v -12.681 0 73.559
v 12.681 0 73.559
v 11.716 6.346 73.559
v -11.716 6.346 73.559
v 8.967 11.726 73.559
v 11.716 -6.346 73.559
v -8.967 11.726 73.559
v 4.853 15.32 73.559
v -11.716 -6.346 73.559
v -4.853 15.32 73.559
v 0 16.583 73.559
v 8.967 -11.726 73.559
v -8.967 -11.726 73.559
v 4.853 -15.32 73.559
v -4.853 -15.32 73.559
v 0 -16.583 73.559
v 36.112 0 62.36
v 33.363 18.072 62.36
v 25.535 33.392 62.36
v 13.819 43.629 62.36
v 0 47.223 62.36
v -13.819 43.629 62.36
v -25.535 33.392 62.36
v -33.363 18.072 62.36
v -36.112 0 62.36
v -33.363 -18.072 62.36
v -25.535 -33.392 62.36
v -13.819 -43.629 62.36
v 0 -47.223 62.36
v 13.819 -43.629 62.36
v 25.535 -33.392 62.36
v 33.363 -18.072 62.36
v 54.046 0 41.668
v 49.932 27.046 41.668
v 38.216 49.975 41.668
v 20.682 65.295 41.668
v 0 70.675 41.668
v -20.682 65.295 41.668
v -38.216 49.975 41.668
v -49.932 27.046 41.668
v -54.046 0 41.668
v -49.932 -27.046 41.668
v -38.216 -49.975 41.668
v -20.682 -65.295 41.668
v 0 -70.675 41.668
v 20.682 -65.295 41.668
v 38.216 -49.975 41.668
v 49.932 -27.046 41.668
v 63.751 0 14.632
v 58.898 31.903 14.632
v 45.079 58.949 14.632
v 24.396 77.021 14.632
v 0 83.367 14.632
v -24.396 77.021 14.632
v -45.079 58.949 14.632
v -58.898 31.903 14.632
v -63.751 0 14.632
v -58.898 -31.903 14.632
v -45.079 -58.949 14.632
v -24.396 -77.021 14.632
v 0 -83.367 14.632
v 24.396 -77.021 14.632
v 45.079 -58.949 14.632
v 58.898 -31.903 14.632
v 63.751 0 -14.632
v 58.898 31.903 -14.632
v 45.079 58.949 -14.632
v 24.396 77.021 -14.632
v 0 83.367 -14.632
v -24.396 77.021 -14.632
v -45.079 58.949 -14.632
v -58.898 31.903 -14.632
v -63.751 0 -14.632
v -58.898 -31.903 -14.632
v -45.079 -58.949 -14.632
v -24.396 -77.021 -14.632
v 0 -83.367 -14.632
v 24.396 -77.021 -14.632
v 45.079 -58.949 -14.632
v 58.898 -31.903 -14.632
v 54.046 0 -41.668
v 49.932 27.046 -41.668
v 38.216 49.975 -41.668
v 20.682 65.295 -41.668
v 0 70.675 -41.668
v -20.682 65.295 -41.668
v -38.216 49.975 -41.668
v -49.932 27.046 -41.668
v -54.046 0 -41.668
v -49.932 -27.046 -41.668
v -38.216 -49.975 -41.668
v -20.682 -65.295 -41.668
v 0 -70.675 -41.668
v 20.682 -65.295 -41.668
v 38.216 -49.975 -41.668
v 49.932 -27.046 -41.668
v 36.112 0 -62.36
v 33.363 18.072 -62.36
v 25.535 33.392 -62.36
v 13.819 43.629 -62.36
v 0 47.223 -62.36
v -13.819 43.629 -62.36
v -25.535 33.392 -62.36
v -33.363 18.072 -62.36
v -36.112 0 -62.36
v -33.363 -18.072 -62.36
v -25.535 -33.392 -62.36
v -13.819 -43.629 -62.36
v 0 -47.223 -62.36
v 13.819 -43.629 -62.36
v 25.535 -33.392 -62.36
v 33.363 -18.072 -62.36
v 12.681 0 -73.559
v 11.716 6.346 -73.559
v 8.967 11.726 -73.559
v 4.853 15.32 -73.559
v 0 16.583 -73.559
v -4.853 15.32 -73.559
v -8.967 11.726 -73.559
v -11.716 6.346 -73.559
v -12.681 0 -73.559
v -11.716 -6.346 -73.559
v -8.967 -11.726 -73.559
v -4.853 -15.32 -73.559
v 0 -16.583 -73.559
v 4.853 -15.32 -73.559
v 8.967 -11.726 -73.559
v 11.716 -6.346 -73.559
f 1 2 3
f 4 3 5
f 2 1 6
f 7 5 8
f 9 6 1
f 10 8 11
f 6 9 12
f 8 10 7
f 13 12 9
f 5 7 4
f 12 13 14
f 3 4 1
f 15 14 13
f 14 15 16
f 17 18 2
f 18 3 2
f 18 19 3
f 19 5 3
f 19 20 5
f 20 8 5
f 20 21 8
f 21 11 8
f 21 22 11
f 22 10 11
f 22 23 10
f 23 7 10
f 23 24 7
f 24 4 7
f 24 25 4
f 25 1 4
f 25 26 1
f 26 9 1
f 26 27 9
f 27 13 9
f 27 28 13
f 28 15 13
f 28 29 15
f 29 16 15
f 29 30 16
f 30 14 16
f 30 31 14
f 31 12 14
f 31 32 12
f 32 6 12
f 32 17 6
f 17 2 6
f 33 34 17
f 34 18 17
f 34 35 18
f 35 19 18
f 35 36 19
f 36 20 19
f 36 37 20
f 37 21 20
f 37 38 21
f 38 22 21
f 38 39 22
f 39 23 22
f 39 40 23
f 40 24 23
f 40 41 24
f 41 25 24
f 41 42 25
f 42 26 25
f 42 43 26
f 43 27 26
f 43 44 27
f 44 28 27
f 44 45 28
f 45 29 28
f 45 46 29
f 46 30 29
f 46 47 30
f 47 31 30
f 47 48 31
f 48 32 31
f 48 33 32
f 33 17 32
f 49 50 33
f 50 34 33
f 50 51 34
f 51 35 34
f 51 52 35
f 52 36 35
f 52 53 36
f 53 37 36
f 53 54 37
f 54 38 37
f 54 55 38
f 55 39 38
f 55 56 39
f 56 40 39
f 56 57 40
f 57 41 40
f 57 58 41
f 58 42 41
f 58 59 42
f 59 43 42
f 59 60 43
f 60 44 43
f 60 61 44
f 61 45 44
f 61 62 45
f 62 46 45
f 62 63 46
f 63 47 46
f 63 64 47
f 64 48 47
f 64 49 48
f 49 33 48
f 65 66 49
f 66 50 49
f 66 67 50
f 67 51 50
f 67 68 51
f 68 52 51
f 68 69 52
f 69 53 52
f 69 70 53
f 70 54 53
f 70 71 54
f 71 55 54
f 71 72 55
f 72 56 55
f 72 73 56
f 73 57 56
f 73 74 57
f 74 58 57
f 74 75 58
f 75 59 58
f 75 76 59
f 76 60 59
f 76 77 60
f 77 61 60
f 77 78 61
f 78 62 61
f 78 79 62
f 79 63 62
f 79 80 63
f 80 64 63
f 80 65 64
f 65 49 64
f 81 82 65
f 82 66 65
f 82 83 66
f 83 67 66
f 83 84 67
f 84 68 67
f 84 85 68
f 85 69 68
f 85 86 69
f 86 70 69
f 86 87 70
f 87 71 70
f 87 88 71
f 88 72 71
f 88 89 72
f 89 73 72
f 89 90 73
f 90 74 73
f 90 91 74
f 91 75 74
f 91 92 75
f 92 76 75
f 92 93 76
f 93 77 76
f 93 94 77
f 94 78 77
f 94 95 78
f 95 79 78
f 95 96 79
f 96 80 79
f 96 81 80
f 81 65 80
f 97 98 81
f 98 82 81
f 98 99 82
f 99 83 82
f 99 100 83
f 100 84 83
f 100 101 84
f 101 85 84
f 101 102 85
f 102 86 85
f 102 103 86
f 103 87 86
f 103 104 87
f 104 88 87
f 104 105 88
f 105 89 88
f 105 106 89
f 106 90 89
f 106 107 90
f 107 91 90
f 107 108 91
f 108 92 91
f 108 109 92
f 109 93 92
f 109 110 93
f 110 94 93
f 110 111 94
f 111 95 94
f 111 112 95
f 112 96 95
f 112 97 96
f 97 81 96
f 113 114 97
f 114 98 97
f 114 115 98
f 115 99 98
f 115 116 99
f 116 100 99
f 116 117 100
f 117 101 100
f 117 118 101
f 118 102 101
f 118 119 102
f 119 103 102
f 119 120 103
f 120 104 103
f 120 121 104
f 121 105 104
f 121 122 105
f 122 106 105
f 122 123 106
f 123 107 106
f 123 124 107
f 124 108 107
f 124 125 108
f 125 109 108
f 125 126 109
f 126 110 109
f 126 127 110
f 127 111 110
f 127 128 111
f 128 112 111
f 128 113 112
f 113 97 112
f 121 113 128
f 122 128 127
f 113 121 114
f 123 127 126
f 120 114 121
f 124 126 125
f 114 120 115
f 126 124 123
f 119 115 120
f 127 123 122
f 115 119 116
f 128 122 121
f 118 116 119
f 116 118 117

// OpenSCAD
// Generated by SolidPython 1.0.1 on 2020-07-29 00:46:51


scale(v = [13, 17, 15]) {
	sphere(r = 5);
}
/***********************************************
*********      SolidPython code:      **********
************************************************
 
# import packages: SolidPython
from solid import *
from solid.utils import *
from itertools import chain, combinations, permutations


class Resize:

    def __init__(self, scad_file):
        self.scad_file = scad_file
        #self.scad_file = import_scad(scad_file)
        # cone/cylinder param:
        self.r1 = 0
        self.r2 = 0
        self.h = 0
        # rectangular prism param:
        self.w = 0
        self.l = 0
        # ellipse param:
        self.r = 0

    # import OpenScad code (file name corresponds to shape)


    # classify shape + parameters
    def assign(self, param1, param2, param3):
        if self.scad_file == 'cone.scad':
            self.r1 = param1
            self.r2 = param2
            self.h = param3
        elif self.scad_file == 'cylinder.scad':
            self.r1 = param1
            self.r2 = param2
            self.h = param3
        elif self.scad_file == 'rectangularPrism.scad':
            self.h = param1
            self.l = param2
            self.w = param3
        else:
            self.r = param1
            self.h = param2

    # resize parameters
    def iterate(self):
        x = range(3, 20, 2)
        i = 1
        if self.scad_file == 'cone.scad':
            tempList = list(permutations(x, 2))
            for temp in tempList:
                param1 = temp[0]
                param2 = temp[1]
                filepath = 'produced_scad_files/' + 'cone' + str(param1) + '_' + str(param2) + '_' + '.scad'
                scad_render_to_file(cylinder(h=param1, r1=param2, r2=0), filepath)

        elif self.scad_file == 'cylinder.scad':
            tempList = list(permutations(x, 3))
            for temp in tempList:
                param1 = temp[0]
                param2 = temp[1]
                filepath = 'produced_scad_files/' + 'cylinder' + str(param1) + '_' + str(param2) + '_' + '.scad'
                scad_render_to_file(cylinder(h=param1, r1=param2, r2=param2), filepath)

        elif self.scad_file == 'rectangularPrism.scad':
            tempList = list(permutations(x, 3))
            for temp in tempList:
                param1 = temp[0]
                param2 = temp[1]
                param3 = temp[2]
                filepath = 'produced_scad_files/' + 'rectangularPrism' + str(param1) + '_' + str(param2) + '_' + str(
                    param3) + '.scad'
                scad_render_to_file(cube(size=(param1, param2, param3)), filepath)

        elif self.scad_file == 'ellipse.scad':
            tempList = list(permutations(x, 4))
            for temp in tempList:
                param1 = temp[0]
                param2 = temp[1]
                param3 = temp[2]
                param4 = temp[3]
                filepath = 'produced_scad_files/' + 'ellipse' + str(param1) + '_' + str(param2) + '_' + str(param3) + '_' + str(param4) + '.scad'
                scad_render_to_file(scale([param1, param2, param3])(sphere(r=param4)), filepath)

    def render_to_scadfile(self):
        scad_render_to_file(scad, 'example.scad') 
 
************************************************/
